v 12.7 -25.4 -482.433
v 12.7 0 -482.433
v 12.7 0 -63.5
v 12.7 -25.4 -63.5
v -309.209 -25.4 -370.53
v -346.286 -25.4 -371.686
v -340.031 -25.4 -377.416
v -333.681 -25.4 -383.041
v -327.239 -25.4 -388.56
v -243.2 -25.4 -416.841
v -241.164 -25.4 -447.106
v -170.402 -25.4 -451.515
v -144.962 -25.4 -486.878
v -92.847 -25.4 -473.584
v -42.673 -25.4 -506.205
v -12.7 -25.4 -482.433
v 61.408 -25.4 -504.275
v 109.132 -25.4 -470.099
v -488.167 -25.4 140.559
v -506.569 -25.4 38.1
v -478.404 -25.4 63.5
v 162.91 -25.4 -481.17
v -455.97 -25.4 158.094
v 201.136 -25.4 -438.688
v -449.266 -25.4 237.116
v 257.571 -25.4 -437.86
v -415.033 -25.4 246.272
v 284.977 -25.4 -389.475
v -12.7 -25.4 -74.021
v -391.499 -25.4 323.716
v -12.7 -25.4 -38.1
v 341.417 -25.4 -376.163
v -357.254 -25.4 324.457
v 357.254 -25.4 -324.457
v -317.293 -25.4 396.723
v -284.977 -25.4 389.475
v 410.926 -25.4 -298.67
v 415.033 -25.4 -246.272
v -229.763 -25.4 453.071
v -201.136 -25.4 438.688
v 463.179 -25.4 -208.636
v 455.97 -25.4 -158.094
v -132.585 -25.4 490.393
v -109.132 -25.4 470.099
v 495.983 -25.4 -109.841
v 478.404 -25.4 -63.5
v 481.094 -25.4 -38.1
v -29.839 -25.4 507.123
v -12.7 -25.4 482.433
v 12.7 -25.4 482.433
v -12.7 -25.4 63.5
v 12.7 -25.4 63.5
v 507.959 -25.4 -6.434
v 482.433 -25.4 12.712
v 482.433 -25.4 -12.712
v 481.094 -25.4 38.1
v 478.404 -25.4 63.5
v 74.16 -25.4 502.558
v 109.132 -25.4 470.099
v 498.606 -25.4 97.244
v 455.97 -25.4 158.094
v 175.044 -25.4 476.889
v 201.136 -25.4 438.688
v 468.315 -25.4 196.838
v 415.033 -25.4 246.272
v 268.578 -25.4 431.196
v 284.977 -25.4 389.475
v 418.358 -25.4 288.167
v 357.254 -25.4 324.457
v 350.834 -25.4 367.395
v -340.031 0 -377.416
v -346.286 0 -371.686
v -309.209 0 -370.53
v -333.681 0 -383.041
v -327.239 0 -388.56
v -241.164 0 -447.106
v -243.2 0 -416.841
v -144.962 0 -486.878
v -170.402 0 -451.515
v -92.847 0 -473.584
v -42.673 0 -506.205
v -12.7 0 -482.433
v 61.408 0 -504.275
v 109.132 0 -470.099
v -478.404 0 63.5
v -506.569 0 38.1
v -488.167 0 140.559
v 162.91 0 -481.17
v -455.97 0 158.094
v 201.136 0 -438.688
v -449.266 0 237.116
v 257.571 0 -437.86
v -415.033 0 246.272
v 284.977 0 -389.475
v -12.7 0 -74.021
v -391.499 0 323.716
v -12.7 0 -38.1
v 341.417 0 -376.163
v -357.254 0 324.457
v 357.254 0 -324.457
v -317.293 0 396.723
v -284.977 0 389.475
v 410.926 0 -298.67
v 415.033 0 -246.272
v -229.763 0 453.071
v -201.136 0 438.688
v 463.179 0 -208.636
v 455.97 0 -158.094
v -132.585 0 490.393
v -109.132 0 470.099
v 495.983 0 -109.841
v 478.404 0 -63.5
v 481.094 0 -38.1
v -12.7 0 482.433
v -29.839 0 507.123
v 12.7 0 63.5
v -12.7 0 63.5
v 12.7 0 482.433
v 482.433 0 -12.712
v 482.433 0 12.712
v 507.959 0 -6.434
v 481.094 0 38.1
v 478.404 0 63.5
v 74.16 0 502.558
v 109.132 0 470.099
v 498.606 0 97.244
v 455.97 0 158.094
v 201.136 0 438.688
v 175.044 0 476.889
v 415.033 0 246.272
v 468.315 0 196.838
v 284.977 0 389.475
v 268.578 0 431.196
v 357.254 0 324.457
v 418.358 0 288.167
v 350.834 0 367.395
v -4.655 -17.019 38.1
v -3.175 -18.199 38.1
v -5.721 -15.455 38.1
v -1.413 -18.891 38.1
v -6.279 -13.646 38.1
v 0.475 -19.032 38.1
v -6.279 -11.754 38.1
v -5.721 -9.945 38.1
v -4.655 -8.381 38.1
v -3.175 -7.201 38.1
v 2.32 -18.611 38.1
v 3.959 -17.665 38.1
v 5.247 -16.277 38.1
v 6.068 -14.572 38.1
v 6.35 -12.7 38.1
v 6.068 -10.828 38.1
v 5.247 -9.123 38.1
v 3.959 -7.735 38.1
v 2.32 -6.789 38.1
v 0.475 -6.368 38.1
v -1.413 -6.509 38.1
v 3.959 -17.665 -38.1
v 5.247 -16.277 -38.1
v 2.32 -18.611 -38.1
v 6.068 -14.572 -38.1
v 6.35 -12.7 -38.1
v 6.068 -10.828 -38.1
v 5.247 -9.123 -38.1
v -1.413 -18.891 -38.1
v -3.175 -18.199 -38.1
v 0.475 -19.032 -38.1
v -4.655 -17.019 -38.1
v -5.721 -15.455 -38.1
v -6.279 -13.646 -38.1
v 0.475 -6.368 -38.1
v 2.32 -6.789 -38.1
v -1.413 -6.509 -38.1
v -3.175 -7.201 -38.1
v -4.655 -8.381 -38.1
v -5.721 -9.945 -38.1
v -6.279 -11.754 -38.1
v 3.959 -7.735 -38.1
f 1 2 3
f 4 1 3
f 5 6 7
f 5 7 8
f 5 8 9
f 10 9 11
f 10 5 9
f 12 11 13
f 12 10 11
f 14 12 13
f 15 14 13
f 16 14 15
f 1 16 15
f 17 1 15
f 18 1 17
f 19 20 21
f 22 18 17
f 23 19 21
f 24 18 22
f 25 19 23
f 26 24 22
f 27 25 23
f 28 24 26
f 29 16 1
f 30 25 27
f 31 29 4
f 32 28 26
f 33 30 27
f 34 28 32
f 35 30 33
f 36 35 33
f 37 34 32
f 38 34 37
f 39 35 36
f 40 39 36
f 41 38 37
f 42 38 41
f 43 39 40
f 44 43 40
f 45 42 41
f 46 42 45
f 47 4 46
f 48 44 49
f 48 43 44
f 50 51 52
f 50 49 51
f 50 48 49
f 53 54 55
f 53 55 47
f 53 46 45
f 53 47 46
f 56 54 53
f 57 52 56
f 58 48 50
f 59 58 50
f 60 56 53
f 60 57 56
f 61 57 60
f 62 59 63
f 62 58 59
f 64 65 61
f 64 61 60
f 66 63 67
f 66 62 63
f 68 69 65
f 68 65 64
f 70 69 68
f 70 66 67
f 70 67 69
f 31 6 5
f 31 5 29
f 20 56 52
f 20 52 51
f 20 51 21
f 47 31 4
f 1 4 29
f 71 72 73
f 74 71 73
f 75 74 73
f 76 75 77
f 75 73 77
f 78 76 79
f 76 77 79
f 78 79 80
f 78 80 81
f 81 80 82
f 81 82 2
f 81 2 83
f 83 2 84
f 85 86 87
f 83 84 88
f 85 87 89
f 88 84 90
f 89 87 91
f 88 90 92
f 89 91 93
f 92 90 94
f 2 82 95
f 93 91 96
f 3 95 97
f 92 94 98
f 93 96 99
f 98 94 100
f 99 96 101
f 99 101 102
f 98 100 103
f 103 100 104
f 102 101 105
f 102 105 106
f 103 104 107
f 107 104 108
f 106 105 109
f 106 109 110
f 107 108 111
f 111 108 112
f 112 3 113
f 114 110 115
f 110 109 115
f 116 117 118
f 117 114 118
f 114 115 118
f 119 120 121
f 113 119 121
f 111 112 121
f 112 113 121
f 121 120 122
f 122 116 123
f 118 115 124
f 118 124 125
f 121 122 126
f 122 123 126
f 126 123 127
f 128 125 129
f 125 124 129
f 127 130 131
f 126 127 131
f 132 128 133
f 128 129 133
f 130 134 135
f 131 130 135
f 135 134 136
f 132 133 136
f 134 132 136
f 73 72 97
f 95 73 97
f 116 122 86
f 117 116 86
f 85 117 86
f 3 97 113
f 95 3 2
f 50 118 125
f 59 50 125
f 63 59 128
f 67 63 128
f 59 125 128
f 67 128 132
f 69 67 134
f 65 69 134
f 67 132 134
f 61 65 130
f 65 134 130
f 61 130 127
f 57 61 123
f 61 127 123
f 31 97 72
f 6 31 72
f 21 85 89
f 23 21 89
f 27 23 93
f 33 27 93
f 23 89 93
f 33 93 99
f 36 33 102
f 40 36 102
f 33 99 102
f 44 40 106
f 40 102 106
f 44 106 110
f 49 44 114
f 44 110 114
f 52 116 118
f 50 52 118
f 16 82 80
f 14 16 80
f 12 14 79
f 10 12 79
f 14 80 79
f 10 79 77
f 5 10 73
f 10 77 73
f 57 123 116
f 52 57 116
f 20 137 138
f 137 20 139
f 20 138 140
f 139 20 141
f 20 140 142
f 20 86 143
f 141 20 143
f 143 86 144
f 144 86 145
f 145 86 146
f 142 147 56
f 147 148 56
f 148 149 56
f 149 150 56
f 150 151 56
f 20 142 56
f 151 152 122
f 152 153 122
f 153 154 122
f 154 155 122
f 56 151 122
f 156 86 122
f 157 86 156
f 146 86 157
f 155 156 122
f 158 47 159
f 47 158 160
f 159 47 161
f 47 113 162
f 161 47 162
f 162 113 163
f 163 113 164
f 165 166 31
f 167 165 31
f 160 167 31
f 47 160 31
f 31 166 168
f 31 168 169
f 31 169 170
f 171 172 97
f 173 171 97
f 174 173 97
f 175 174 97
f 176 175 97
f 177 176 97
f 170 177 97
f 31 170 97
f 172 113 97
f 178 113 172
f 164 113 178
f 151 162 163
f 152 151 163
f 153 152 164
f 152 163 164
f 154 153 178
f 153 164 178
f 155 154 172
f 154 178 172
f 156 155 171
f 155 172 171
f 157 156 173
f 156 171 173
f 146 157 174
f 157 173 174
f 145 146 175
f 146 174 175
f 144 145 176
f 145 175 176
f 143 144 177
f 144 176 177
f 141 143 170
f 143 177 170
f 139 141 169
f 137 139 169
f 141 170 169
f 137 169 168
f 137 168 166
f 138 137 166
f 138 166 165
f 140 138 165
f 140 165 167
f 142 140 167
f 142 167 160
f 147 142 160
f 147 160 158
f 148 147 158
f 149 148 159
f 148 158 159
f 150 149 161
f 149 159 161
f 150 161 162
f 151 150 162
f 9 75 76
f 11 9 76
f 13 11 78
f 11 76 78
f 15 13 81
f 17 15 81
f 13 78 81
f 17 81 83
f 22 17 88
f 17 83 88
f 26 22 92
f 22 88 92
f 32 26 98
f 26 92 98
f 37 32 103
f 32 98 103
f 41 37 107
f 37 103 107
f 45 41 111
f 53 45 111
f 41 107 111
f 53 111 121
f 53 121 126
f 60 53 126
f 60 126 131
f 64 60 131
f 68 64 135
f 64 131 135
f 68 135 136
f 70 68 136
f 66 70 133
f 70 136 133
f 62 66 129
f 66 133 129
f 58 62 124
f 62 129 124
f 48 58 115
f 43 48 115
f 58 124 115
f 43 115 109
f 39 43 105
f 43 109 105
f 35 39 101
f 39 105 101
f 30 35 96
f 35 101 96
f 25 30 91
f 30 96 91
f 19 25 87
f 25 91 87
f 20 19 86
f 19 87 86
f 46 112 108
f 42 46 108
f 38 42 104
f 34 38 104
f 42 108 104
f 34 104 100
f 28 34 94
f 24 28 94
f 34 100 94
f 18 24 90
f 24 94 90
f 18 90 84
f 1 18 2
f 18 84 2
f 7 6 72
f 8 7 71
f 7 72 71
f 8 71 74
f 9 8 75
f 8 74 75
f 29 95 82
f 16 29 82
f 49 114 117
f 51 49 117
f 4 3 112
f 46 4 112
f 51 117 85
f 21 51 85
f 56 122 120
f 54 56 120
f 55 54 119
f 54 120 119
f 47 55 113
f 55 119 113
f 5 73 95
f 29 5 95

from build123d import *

# Parameters (mm, degrees)
F1_DEPTH = 25.4
F2_R     = 6.35
F3_DEPTH = 76.2


with BuildPart() as f1:
    # F0 (on Front) → F1 (new body)
    with BuildSketch(Plane.XZ):
        with BuildLine():
            Line((-12.7, -38.1), (-346.285668, -371.685668))
            ThreePointArc((-346.285668, -371.685668), (-336.867918, -380.242036), (-327.238821, -388.559846))
            ThreePointArc((-327.238821, -388.559846), (468.314664, 196.83845), (-506.569235, 38.1))
            Line((-506.569235, 38.1), (-12.7, 38.1))
            Line((-12.7, 38.1), (481.093702, 38.1))
            ThreePointArc((481.093702, 38.1), (482.6, 0), (481.093702, -38.1))
            Line((481.093702, -38.1), (-12.7, -38.1))
        make_face()
        with BuildLine():
            Line((-309.209041, -370.530065), (-12.7, -74.021024))
            Line((-12.7, -74.021024), (-12.7, -482.432866))
            ThreePointArc((-12.7, -482.432866), (-170.402221, -451.515053), (-309.209041, -370.530065))
        make_face(mode=Mode.SUBTRACT)
        with BuildLine():
            ThreePointArc((478.404128, -63.5), (322.756879, -358.790687), (12.7, -482.432866))
            Line((12.7, -482.432866), (12.7, -63.5))
            Line((12.7, -63.5), (478.404128, -63.5))
        make_face(mode=Mode.SUBTRACT)
        with BuildLine():
            ThreePointArc((-478.404128, 63.5), (-322.756879, 358.790687), (-12.7, 482.432866))
            Line((-12.7, 482.432866), (-12.7, 63.5))
            Line((-12.7, 63.5), (-478.404128, 63.5))
        make_face(mode=Mode.SUBTRACT)
        with BuildLine():
            Line((12.7, 63.5), (12.7, 482.432866))
            ThreePointArc((12.7, 482.432866), (322.756879, 358.790687), (478.404128, 63.5))
            Line((478.404128, 63.5), (12.7, 63.5))
        make_face(mode=Mode.SUBTRACT)
    extrude(amount=F1_DEPTH)

    # F2 (on face) → F3 (join, through all)
    with BuildSketch(Plane.XY.offset(-38.1)):
        with Locations((0, -12.7)):
            Circle(F2_R)
    extrude(amount=F3_DEPTH)


solid = f1.part
